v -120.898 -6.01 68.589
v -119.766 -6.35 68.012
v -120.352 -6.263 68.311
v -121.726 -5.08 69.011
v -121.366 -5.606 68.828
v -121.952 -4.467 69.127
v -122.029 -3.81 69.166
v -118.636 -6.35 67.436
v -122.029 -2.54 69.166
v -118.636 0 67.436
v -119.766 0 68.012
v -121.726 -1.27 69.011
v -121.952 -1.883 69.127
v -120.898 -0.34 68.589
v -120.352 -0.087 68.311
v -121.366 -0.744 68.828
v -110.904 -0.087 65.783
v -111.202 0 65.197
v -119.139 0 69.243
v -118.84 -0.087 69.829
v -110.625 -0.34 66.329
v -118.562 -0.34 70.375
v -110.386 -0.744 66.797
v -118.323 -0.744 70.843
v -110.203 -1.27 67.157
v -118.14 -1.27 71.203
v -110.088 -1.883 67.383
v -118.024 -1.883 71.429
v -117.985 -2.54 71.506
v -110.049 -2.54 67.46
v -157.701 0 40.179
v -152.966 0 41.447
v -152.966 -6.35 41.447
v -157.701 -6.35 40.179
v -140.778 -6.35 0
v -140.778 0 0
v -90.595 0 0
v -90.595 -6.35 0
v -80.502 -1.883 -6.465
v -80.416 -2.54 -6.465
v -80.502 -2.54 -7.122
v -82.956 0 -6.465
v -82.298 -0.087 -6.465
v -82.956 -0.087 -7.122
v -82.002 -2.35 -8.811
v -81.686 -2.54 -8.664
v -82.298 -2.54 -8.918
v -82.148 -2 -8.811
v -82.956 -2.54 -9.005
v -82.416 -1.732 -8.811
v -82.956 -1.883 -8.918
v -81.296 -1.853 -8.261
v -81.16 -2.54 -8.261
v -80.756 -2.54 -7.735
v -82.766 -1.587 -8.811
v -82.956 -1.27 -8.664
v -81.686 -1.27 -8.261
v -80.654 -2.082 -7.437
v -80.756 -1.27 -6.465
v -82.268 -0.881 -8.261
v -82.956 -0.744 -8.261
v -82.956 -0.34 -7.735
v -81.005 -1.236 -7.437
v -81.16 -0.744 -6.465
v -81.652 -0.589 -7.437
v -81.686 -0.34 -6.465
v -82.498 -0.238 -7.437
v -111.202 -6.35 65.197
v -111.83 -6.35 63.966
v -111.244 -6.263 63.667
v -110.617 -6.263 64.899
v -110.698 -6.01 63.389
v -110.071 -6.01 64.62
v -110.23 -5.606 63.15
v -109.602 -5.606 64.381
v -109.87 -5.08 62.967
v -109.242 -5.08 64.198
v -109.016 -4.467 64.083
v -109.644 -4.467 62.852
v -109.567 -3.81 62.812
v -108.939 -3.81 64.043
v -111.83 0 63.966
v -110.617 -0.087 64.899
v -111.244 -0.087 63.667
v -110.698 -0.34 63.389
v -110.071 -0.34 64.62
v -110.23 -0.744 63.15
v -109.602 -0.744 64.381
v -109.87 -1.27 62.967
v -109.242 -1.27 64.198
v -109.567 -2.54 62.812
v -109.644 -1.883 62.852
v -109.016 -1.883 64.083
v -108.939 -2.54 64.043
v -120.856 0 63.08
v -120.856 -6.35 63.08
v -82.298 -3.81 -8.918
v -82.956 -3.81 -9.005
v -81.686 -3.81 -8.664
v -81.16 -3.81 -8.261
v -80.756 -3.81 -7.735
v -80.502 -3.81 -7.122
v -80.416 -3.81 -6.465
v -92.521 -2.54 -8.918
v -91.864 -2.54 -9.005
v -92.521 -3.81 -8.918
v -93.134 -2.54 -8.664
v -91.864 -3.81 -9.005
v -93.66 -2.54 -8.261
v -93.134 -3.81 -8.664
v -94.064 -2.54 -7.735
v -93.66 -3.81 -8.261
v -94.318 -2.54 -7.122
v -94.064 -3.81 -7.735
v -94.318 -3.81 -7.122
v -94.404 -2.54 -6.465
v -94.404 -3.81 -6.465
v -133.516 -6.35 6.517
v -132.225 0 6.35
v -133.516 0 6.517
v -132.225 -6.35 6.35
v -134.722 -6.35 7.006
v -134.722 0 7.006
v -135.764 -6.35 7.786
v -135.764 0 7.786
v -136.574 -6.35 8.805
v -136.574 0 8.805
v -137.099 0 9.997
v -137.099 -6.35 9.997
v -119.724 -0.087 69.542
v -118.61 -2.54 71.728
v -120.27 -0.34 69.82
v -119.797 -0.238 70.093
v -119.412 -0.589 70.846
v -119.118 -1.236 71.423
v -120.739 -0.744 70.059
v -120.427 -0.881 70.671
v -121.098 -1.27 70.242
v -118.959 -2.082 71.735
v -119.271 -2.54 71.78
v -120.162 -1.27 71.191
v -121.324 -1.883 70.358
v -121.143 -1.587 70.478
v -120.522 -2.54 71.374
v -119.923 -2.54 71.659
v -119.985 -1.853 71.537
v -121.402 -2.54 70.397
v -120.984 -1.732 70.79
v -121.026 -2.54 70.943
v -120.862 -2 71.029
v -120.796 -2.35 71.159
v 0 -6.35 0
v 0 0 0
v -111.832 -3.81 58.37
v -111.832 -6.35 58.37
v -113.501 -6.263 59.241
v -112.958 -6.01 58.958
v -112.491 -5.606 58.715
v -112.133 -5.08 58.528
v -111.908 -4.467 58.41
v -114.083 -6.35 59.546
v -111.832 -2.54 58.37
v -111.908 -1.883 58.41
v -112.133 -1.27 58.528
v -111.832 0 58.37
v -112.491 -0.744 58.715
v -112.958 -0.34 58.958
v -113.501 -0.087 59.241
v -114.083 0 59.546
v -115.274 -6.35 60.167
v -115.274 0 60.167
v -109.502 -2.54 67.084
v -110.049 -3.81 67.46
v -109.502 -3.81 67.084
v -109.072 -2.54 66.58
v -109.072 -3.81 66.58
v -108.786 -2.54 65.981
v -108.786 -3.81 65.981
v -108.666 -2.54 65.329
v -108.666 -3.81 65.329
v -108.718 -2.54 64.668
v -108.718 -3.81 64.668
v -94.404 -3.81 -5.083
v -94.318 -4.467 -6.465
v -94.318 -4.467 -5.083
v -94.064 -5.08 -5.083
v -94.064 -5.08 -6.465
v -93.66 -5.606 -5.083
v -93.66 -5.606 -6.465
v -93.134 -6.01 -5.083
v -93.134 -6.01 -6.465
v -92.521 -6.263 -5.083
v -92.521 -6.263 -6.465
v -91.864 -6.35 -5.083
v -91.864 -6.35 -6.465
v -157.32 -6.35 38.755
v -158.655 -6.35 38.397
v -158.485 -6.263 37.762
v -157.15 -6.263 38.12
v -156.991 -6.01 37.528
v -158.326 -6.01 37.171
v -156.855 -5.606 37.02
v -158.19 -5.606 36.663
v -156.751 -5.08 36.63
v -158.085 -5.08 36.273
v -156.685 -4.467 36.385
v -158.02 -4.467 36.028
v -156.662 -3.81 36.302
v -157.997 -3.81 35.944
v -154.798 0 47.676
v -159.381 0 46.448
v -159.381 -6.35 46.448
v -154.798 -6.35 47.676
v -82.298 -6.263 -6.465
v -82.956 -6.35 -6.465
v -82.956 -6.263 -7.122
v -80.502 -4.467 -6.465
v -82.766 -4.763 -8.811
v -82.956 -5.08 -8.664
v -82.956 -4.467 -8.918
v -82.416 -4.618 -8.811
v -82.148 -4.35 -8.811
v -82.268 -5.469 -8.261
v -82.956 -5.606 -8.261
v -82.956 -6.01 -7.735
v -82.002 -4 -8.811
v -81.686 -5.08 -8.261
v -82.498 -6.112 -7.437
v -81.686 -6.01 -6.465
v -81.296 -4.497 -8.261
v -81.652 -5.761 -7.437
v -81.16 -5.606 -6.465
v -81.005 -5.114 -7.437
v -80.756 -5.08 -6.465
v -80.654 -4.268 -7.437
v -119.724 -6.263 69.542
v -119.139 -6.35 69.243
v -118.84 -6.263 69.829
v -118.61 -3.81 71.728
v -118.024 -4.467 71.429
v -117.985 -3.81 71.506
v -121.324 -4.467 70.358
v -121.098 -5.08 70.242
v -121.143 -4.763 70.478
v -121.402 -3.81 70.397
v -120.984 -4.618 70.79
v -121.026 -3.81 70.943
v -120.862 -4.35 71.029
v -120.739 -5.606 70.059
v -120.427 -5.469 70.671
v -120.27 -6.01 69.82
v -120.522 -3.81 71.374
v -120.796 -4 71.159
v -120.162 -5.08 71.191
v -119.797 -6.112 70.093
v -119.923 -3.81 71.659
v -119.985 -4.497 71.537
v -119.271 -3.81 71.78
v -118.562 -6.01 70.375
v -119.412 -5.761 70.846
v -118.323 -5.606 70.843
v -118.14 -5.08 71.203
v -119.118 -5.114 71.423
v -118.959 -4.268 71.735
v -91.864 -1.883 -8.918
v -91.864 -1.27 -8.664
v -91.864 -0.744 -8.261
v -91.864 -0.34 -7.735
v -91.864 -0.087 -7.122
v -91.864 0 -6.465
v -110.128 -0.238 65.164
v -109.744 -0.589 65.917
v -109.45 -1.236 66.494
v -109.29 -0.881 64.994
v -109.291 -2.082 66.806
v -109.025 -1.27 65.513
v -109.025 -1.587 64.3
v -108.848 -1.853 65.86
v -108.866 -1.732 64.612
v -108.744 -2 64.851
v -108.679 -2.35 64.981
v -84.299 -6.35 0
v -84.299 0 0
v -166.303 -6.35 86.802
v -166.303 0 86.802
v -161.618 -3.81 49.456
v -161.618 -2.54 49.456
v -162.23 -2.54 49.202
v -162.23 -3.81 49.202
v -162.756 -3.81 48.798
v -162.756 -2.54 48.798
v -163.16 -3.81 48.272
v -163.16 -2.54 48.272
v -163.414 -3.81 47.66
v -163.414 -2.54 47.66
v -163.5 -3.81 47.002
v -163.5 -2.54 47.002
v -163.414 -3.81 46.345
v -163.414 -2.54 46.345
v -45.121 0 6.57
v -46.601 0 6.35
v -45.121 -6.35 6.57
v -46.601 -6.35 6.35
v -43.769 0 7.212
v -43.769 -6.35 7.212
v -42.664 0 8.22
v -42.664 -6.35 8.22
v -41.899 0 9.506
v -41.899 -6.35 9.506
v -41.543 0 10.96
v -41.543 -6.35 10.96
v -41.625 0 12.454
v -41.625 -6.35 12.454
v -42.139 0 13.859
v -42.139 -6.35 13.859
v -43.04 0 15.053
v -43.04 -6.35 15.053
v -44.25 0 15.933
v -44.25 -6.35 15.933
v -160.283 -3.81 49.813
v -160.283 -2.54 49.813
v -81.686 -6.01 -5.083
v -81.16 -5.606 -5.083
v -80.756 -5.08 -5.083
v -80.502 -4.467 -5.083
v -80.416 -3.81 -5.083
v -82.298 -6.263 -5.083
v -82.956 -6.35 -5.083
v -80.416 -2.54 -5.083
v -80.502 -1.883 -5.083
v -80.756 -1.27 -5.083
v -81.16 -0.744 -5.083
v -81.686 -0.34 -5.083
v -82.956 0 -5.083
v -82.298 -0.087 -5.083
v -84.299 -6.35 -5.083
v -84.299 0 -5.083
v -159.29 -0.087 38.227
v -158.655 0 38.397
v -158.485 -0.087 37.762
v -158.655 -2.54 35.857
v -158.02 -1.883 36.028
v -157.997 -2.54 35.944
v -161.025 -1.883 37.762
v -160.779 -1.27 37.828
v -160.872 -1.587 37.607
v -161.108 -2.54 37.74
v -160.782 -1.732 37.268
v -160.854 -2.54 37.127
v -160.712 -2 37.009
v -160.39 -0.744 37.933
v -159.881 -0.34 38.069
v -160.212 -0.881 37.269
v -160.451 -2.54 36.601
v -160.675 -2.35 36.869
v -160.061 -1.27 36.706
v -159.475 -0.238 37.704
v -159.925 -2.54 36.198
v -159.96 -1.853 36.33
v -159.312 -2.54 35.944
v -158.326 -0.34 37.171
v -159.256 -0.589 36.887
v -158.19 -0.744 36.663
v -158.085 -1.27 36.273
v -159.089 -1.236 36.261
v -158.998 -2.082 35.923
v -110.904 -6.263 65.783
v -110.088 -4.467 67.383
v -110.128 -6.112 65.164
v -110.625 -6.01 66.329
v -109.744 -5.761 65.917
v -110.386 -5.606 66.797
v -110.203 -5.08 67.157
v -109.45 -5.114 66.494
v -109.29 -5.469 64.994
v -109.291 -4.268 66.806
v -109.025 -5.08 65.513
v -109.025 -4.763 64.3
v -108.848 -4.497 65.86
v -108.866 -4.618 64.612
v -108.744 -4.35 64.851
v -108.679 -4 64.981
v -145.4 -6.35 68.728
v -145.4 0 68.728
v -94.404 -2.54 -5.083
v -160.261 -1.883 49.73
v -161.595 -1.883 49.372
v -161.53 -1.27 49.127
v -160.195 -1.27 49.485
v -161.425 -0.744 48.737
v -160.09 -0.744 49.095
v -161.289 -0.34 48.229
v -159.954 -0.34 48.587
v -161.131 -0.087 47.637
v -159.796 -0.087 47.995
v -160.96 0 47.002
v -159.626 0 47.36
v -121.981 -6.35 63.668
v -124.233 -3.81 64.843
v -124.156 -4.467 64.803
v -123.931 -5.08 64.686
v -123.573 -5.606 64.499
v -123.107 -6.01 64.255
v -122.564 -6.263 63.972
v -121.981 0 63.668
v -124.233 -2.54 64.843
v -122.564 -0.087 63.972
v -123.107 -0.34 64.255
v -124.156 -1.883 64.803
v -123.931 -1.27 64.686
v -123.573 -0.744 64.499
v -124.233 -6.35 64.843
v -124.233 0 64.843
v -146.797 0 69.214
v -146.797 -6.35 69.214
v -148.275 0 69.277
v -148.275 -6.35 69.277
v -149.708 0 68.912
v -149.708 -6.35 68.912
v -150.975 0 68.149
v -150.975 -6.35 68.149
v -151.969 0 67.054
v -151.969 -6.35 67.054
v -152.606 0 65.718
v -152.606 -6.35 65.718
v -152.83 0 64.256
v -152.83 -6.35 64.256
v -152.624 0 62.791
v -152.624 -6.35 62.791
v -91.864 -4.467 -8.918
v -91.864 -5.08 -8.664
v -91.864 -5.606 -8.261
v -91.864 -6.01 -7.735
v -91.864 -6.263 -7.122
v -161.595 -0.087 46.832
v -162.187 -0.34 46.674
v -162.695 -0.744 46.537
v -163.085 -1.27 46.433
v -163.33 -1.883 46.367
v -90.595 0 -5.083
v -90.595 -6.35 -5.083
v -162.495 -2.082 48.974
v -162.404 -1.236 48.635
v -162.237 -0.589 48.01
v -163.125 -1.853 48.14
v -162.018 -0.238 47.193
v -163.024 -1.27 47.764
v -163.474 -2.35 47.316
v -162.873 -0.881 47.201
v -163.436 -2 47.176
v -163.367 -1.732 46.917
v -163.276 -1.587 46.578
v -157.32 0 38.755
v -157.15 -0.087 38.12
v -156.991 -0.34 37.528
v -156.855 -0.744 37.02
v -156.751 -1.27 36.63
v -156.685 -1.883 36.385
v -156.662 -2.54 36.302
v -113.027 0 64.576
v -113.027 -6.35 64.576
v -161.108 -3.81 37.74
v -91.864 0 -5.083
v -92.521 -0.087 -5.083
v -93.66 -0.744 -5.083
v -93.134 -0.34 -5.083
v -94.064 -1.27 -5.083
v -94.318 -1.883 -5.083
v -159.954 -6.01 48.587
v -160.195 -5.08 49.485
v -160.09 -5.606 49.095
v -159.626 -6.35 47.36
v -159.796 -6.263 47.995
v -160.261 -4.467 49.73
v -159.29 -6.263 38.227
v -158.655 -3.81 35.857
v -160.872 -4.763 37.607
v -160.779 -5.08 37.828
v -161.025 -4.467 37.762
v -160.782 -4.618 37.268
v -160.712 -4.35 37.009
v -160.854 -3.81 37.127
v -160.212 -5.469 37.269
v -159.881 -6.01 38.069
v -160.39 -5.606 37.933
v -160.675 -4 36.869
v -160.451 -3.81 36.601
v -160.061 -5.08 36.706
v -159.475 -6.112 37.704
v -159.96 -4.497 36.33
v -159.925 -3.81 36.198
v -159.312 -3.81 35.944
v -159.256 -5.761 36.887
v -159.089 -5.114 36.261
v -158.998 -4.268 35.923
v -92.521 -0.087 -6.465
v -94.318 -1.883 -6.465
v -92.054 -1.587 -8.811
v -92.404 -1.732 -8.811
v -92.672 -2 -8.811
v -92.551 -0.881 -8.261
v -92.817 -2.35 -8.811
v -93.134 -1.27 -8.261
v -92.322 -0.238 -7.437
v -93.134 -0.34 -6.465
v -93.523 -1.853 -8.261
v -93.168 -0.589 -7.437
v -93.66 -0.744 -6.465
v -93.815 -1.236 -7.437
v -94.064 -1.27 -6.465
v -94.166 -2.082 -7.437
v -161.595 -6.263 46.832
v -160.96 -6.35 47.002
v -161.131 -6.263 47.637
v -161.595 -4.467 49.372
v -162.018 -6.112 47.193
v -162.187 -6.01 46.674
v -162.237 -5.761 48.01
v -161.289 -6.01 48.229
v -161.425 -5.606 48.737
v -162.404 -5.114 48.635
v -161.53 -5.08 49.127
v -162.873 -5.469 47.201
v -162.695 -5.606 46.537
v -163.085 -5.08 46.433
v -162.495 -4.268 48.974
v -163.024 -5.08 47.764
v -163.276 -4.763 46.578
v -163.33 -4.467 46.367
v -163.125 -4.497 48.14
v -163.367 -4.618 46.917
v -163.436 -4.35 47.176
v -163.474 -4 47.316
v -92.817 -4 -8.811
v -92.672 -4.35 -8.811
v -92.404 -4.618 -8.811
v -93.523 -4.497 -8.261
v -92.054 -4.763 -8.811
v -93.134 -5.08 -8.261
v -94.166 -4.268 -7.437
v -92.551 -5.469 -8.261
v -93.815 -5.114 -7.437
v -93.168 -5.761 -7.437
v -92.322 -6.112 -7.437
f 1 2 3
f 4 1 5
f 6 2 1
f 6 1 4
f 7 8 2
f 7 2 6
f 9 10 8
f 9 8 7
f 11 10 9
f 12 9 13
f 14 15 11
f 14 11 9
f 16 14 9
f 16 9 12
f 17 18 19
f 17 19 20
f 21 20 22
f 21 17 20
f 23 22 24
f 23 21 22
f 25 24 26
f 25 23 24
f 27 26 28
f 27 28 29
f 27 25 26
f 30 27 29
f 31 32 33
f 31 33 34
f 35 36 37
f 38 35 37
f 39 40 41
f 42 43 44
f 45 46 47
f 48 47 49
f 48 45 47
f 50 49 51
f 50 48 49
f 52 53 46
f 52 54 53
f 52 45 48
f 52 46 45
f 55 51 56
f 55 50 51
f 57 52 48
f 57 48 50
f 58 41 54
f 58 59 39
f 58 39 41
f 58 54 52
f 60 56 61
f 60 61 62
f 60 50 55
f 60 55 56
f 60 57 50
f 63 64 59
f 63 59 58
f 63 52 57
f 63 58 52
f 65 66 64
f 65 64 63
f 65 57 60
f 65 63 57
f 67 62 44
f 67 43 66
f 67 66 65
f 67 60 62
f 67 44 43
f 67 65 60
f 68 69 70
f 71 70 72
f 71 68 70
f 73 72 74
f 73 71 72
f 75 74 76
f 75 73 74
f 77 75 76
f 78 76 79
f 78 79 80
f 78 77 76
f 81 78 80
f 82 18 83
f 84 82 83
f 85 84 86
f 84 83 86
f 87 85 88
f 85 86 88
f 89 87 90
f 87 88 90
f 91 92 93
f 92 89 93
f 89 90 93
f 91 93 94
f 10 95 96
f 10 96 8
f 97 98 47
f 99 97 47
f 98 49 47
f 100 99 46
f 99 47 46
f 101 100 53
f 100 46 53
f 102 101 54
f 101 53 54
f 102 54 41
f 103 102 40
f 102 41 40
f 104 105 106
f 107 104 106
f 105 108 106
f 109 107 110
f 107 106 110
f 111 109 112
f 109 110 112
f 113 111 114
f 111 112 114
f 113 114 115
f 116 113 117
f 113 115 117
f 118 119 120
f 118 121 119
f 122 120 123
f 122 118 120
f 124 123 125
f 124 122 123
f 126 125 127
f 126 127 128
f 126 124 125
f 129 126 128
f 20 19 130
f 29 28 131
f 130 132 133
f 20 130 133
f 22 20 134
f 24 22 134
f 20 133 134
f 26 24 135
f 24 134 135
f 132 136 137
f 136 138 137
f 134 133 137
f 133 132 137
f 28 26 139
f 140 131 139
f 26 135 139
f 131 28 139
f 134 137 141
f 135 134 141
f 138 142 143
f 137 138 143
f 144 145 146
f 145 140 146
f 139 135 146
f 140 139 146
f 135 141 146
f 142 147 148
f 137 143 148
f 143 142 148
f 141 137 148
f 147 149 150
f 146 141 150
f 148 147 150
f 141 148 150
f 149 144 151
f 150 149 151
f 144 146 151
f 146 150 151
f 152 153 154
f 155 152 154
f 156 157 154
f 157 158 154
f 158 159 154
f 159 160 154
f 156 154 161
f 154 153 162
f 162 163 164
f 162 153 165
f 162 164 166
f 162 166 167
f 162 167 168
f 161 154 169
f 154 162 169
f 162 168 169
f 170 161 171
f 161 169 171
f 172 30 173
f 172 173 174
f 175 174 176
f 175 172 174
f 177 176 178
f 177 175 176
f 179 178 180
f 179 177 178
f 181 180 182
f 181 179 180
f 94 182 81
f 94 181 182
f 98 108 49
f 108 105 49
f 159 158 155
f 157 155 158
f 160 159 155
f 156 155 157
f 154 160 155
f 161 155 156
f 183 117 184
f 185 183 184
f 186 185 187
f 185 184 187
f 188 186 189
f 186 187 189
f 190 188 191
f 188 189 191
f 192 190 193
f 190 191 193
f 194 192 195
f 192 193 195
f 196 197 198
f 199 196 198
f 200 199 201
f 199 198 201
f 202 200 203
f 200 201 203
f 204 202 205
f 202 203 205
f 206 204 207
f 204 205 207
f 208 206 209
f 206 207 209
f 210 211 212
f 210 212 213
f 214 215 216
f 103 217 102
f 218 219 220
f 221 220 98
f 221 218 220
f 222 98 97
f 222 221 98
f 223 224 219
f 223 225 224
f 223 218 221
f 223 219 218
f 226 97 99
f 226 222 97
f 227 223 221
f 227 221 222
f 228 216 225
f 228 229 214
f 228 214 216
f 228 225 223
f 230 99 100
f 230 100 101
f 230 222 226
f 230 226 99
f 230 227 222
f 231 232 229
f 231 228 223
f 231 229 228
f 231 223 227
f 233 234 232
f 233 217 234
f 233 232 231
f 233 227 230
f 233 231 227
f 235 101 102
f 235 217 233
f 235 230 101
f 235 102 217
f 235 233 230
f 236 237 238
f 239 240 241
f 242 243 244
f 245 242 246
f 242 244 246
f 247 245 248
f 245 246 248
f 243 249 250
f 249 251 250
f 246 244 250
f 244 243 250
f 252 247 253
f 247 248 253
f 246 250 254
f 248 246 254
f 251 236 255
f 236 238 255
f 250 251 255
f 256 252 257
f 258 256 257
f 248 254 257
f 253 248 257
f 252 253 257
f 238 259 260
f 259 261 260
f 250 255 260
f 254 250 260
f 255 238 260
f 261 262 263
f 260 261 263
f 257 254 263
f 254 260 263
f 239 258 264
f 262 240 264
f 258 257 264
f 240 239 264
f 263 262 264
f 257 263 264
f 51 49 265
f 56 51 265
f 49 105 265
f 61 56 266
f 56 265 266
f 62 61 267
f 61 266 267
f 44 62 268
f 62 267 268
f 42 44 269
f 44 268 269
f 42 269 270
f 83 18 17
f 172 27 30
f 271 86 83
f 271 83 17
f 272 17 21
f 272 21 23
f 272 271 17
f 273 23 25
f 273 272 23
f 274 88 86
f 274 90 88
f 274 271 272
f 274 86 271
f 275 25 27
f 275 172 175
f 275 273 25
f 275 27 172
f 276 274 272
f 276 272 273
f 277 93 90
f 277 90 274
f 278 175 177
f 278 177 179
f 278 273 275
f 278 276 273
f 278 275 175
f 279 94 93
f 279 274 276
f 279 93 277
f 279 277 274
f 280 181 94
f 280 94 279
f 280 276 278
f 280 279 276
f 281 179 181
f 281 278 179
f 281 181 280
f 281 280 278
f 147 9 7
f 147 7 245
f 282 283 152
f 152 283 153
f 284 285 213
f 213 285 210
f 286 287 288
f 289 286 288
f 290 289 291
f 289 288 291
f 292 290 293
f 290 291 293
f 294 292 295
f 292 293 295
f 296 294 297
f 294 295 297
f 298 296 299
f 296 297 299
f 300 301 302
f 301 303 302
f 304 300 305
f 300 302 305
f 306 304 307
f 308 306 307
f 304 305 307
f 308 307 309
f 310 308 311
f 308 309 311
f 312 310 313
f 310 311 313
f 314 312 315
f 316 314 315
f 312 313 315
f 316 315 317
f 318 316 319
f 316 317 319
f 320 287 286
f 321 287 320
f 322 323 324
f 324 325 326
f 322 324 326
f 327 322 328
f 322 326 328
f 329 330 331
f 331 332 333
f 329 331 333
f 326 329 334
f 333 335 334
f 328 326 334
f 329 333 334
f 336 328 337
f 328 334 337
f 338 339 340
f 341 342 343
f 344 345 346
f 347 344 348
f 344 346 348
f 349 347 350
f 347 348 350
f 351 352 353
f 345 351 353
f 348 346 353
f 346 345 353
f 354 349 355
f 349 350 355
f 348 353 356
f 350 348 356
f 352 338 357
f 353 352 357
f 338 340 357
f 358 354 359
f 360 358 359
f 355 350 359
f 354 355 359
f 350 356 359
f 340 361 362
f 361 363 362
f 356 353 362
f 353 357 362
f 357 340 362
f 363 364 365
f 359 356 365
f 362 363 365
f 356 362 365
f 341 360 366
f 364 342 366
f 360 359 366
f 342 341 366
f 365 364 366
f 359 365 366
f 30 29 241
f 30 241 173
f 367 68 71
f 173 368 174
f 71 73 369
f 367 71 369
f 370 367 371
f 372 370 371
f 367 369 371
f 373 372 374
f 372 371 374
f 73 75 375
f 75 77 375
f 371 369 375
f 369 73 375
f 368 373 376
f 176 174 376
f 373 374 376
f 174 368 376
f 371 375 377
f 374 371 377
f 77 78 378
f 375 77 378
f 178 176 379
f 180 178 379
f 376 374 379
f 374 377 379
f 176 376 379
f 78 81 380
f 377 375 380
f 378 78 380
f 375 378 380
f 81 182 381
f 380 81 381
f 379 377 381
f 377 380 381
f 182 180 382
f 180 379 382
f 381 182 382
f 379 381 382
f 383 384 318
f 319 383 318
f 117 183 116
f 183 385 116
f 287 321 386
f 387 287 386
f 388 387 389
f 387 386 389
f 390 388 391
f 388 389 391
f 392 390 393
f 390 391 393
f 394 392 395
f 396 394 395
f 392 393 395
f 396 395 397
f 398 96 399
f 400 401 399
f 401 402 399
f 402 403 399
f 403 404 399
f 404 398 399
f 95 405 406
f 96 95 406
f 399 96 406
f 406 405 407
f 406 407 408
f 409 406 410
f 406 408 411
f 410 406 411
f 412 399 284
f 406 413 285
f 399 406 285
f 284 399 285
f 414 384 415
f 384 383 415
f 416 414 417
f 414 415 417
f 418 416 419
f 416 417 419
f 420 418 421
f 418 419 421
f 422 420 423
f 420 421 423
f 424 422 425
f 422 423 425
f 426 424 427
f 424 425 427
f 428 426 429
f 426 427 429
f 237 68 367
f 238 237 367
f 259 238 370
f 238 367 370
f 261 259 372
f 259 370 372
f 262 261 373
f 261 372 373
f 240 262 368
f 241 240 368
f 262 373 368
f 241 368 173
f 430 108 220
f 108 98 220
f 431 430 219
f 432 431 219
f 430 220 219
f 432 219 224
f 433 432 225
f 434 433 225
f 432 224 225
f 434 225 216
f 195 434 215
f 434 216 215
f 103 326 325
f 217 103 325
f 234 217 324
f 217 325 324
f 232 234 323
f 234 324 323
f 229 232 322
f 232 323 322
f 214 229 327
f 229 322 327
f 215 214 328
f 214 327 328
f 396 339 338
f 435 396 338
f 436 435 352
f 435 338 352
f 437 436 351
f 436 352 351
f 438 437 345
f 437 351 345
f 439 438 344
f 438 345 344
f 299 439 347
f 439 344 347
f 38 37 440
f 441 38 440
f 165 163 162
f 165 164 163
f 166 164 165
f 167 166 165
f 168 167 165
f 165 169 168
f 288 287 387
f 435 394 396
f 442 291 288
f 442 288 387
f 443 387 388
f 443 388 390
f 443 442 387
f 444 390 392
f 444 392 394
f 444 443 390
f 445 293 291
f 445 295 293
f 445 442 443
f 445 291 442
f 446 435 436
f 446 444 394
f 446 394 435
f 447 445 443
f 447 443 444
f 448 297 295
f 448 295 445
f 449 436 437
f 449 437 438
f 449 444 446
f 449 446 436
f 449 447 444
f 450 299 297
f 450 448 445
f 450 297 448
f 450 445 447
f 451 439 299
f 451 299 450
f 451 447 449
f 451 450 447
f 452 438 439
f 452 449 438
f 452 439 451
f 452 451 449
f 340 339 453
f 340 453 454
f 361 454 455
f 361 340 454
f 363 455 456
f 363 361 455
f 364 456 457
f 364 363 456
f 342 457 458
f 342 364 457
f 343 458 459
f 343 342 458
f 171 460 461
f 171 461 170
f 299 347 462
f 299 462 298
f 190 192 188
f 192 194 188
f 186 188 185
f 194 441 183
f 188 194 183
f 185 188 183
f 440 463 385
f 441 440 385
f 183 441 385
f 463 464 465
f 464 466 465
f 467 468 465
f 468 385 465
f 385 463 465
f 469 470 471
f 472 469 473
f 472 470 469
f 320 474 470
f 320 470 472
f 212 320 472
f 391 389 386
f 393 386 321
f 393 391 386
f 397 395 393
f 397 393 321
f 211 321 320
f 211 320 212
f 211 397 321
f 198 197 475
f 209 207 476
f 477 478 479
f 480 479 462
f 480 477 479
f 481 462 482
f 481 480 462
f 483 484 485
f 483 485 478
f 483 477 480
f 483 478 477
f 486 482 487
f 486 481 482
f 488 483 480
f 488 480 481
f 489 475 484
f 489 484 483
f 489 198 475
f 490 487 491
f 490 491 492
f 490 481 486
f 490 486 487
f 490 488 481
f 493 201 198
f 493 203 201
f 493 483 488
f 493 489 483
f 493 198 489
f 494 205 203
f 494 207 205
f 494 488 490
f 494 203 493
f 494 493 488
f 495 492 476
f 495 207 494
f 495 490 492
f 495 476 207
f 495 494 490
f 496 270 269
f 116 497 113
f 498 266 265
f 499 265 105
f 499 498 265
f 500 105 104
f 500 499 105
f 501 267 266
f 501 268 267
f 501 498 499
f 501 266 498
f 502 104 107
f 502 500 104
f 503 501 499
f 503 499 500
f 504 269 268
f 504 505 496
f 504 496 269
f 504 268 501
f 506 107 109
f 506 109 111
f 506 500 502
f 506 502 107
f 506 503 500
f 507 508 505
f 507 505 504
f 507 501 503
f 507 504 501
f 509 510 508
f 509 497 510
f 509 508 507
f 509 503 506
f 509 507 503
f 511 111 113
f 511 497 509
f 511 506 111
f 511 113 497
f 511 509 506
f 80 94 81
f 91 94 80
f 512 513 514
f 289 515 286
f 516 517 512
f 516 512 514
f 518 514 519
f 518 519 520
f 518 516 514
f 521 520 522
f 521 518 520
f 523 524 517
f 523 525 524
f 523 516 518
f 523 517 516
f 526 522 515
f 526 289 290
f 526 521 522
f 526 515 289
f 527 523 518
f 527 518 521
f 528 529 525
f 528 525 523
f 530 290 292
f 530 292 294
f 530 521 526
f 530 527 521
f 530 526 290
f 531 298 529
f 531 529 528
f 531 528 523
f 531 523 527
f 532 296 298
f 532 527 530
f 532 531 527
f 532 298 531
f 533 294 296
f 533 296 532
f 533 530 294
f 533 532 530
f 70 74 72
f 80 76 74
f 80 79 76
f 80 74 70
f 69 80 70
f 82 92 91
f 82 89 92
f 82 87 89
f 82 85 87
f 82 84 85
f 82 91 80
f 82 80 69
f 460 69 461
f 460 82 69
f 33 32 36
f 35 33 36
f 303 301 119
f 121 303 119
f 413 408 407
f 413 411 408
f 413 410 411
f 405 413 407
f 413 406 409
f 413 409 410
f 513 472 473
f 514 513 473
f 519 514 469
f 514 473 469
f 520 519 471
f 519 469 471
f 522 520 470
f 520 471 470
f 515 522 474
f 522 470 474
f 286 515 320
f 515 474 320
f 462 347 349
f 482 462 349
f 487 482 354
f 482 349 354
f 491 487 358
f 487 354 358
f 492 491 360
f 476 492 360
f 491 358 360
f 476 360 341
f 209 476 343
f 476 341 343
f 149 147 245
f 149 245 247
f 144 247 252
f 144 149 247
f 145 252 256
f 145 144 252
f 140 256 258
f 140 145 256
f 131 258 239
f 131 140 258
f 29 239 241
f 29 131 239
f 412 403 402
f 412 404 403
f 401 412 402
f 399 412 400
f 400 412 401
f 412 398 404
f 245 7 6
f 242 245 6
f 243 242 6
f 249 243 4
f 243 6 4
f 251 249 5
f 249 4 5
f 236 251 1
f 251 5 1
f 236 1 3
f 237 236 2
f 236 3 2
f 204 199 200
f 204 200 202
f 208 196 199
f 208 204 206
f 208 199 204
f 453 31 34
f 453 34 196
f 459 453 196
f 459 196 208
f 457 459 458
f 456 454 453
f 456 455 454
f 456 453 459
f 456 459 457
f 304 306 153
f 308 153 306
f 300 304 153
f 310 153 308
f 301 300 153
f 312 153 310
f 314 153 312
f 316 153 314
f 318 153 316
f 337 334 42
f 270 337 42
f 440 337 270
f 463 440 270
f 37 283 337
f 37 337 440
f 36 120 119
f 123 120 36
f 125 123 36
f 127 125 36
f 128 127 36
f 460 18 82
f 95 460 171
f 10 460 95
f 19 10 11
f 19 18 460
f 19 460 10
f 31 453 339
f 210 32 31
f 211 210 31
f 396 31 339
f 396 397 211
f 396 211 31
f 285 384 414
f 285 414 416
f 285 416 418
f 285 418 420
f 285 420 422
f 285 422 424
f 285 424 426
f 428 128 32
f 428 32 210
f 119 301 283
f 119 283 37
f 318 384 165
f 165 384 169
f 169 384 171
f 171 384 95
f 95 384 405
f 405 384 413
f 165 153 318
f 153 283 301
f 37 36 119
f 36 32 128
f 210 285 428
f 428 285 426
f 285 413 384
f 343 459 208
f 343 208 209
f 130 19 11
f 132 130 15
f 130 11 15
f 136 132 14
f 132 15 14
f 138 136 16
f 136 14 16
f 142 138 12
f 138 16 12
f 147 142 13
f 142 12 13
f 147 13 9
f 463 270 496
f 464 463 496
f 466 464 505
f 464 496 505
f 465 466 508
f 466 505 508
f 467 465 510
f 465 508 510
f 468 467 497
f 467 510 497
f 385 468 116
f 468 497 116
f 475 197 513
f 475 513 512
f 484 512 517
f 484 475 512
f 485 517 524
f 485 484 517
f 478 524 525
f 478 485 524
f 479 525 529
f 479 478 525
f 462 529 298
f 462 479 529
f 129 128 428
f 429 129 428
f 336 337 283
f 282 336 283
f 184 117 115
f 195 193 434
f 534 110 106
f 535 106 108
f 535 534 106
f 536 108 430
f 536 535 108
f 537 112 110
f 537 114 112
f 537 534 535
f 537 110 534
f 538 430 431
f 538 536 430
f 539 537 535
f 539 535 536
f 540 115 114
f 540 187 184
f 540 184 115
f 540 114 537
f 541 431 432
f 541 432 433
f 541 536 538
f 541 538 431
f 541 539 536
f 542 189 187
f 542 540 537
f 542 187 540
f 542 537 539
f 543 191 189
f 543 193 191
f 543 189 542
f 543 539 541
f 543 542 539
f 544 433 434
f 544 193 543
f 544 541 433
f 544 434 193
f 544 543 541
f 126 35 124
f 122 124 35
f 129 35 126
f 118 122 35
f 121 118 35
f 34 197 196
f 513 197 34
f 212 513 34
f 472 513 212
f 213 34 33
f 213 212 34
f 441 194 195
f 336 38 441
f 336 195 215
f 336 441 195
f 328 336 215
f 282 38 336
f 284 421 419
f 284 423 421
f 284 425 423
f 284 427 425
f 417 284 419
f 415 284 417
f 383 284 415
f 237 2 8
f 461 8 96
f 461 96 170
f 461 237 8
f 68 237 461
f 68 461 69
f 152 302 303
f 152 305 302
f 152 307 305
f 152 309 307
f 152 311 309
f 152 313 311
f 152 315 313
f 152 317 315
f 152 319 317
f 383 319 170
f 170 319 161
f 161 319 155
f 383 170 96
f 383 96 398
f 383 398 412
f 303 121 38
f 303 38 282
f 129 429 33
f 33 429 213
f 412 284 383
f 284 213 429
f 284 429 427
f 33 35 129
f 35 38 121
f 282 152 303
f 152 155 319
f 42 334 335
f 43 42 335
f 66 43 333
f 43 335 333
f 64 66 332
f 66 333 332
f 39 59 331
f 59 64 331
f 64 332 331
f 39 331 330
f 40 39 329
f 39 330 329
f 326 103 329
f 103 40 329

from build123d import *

# Parameters (mm, degrees)
F1_DEPTH      = 6.35
F2_R          = 5.08
F4_DEPTH      = 6.35
F5_R          = 2.54
F6_R          = 2.54
F7_R          = 2.54
F8_R          = 2.54
F10_DEPTH     = 6.35
F11_R         = 2.54
F12_R         = 2.54
F13_T1_DEPTH  = 8.9083831143
F13_T3_DEPTH  = 1.27
F13_T6_ANGLE  = 90
F13_T8_ANGLE  = 90
F13_T10_ANGLE = 90
F13_T12_ANGLE = 90
F15_DEPTH     = 6.35
F16_R         = 2.54
F17_T1_DEPTH  = 1.27
F17_T4_ANGLE  = 90
F17_T6_ANGLE  = 90
F17_T10_DEPTH = 7.7319413884
F17_T15_DEPTH = 7.7319413884
F18_T1_DEPTH  = 1.27
F18_T4_ANGLE  = 90
F18_T8_DEPTH  = 7.7319413884
F18_T13_DEPTH = 7.7319413884
F18_T16_ANGLE = 90


# Not quite as in the source:
# - a fillet or chamfer that OpenCascade refuses, or shapes differently, is made with other operations: its cross-section is extruded or revolved along the edge and cut away or added


with BuildPart() as f1:
    # F0 (on Front) → F1 (new body)
    with BuildSketch(Plane.XZ):
        Polygon((-140.7776176929, 0), (0, 0), (-166.3033664227, 86.8016779423), align=None)
        Polygon((-136.0260884312, 6.35), (-155.9960301785, 74.2588582448), (-25.8894239036, 6.35), align=None, mode=Mode.SUBTRACT)
    extrude(amount=F1_DEPTH)

    # F2
    f2_edges = [f1.edges().sort_by_distance(p)[0] for p in [
        (-155.99603, -3.175, 74.258858),
        (-25.889424, -3.175, 6.35),
        (-136.026088, -3.175, 6.35),
    ]]
    fillet(f2_edges, radius=F2_R)

    # F3 (on Front) → F4 (join)
    with BuildSketch(Plane.XZ):
        Polygon((-84.2989161611, 0), (-90.5948132277, 0), (-90.5948132277, -5.0825621001), (-94.4040864706, -5.0825621001), (-94.4040864706, -9.0045034885), (-80.4157033563, -9.0045034885), (-80.4157033563, -5.0825621001), (-84.2989161611, -5.0825621001), align=None)
    extrude(amount=F4_DEPTH)

    # F5
    f5_edges = [f1.edges().sort_by_distance(p)[0] for p in [
        (-80.415703, 0, -7.043533),
    ]]
    fillet(f5_edges, radius=F5_R)

    # F6
    f6_edges = [f1.edges().sort_by_distance(p)[0] for p in [
        (-94.404086, 0, -7.043533),
    ]]
    fillet(f6_edges, radius=F6_R)

    # F7
    f7_edges = [f1.edges().sort_by_distance(p)[0] for p in [
        (-94.404086, -6.35, -7.043533),
        (-80.415703, -6.35, -7.043533),
    ]]
    fillet(f7_edges, radius=F7_R)

    # F8
    f8_edges = [f1.edges().sort_by_distance(p)[0] for p in [
        (-87.409895, -6.35, -9.004503),
        (-87.409895, 0, -9.004503),
    ]]
    fillet(f8_edges, radius=F8_R)

    # F9 (on face) → F10 (join)
    with BuildSketch(Plane(origin=(0, 0, 0), x_dir=(-1, 0, 0), z_dir=(0, 1, 0))):
        Polygon((154.6036799573, 47.7280417937), (152.9238455726, 41.4588145216), (152.9660739724, 41.4474994559), (154.7977033408, 47.6760533848), align=None)
        Polygon((154.7977033408, 47.6760533848), (152.9660739724, 41.4474994559), (157.7012996051, 40.1786995717), (156.6624483483, 36.3016538997), (160.4507528245, 35.2865807746), (164.0712127847, 48.7983212928), (160.2829083085, 49.8133944179), (159.3811339898, 46.4479268438), align=None)
    extrude(amount=-F10_DEPTH)

    # F11
    f11_edges = [f1.edges().sort_by_distance(p)[0] for p in [
        (-162.177061, -6.35, 49.305858),
        (-158.556601, -6.35, 35.794117),
    ]]
    fillet(f11_edges, radius=F11_R)

    # F12
    f12_edges = [f1.edges().sort_by_distance(p)[0] for p in [
        (-162.177061, 0, 49.305858),
        (-158.556601, 0, 35.794117),
    ]]
    fillet(f12_edges, radius=F12_R)

    # F13: fillet of radius 2.54 on 6 edges, made by hand

    # F13_s2 → F13_t1 (cut)
    with BuildSketch(Plane(origin=(-20.2272079793, 0, 75.488967874), x_dir=(0, 1, 0), z_dir=(-0.2588190451, 0, 0.9659258263))):
        with BuildLine():
            ThreePointArc((0, 143.3106868597), (-0.7439487758, 145.1067380839), (-2.54, 145.8506868597))
            Line((-2.54, 145.8506868597), (0, 145.8506868597))
            Line((0, 145.8506868597), (0, 143.3106868597))
        make_face()
        with BuildLine():
            ThreePointArc((-6.35, 143.3106868597), (-5.6060512242, 145.1067380839), (-3.81, 145.8506868597))
            Line((-3.81, 145.8506868597), (-6.35, 145.8506868597))
            Line((-6.35, 145.8506868597), (-6.35, 143.3106868597))
        make_face()
    extrude(amount=F13_T1_DEPTH, mode=Mode.SUBTRACT)

    # F13_s4 → F13_t3 (cut)
    with BuildSketch(Plane.XZ.offset(2.54)):
        with BuildLine():
            ThreePointArc((-161.1081531991, 37.7400323734), (-159.9247016003, 36.1977282224), (-157.9973012258, 35.9439811492))
            Line((-157.9973012258, 35.9439811492), (-160.4507528245, 35.2865807746))
            Line((-160.4507528245, 35.2865807746), (-161.1081531991, 37.7400323734))
        make_face()
        with BuildLine():
            ThreePointArc((-161.617761186, 49.4557216674), (-163.160065337, 48.2722700686), (-163.4138124102, 46.344869694))
            Line((-163.4138124102, 46.344869694), (-164.0712127847, 48.7983212928))
            Line((-164.0712127847, 48.7983212928), (-161.617761186, 49.4557216674))
        make_face()
    extrude(amount=F13_T3_DEPTH, mode=Mode.SUBTRACT)

    # F13_s5 → F13_t6 (revolve, cut)
    with BuildSketch(Plane.XZ.offset(2.54)):
        with BuildLine():
            ThreePointArc((-161.617761186, 49.4557216674), (-163.160065337, 48.2722700686), (-163.4138124102, 46.344869694))
            Line((-163.4138124102, 46.344869694), (-164.0712127847, 48.7983212928))
            Line((-164.0712127847, 48.7983212928), (-161.617761186, 49.4557216674))
        make_face()
    revolve(axis=Axis((-163.4138124102, -2.54, 46.344869694), (-0.9659258263, 0, -0.2588190451)), revolution_arc=F13_T6_ANGLE, mode=Mode.SUBTRACT)

    # F13_s7 → F13_t8 (revolve, cut)
    with BuildSketch(Plane(origin=(-22.5328671904, 0, 84.0938051946), x_dir=(0, 1, 0), z_dir=(0.2588190451, 0, -0.9659258263))):
        with BuildLine():
            ThreePointArc((-6.35, -143.3106868597), (-5.6060512242, -145.1067380839), (-3.81, -145.8506868597))
            Line((-3.81, -145.8506868597), (-6.35, -145.8506868597))
            Line((-6.35, -145.8506868597), (-6.35, -143.3106868597))
        make_face()
    revolve(axis=Axis((-163.4138124102, -3.81, 46.344869694), (-0.9659258263, 0, -0.2588190451)), revolution_arc=F13_T8_ANGLE, mode=Mode.SUBTRACT)

    # F13_s9 → F13_t10 (revolve, cut)
    with BuildSketch(Plane(origin=(-20.2272079793, 0, 75.488967874), x_dir=(0, 1, 0), z_dir=(-0.2588190451, 0, 0.9659258263))):
        with BuildLine():
            ThreePointArc((-3.81, 145.8506868597), (-5.6060512242, 145.1067380839), (-6.35, 143.3106868597))
            Line((-6.35, 143.3106868597), (-6.35, 145.8506868597))
            Line((-6.35, 145.8506868597), (-3.81, 145.8506868597))
        make_face()
    revolve(axis=Axis((-161.1081531991, -3.81, 37.7400323734), (0.9659258263, 0, 0.2588190451)), revolution_arc=F13_T10_ANGLE, mode=Mode.SUBTRACT)

    # F13_s11 → F13_t12 (revolve, cut)
    with BuildSketch(Plane(origin=(-20.2272079793, 0, 75.488967874), x_dir=(0, 1, 0), z_dir=(-0.2588190451, 0, 0.9659258263))):
        with BuildLine():
            ThreePointArc((-2.54, 145.8506868597), (-0.7439487758, 145.1067380839), (0, 143.3106868597))
            Line((0, 143.3106868597), (0, 145.8506868597))
            Line((0, 145.8506868597), (-2.54, 145.8506868597))
        make_face()
    revolve(axis=Axis((-161.1081531991, -2.54, 37.7400323734), (-0.9659258263, 0, -0.2588190451)), revolution_arc=F13_T12_ANGLE, mode=Mode.SUBTRACT)

    # F14 (on face) → F15 (join)
    with BuildSketch(Plane(origin=(0, 0, 0), x_dir=(-1, 0, 0), z_dir=(0, 1, 0))):
        Polygon((115.2743030785, 60.1671700704), (120.8559281551, 63.0804870568), (118.6355388683, 67.435692909), (122.0292159852, 69.1658715892), (120.2478632331, 72.6599246264), (107.7856289299, 66.3063761433), (109.5669816821, 62.8123231061), (113.026531469, 64.5760852667), align=None)
    extrude(amount=-F15_DEPTH)

    # F16
    f16_edges = [f1.edges().sort_by_distance(p)[0] for p in [
        (-114.016746, -6.35, 69.48315),
        (-114.016746, 0, 69.48315),
    ]]
    fillet(f16_edges, radius=F16_R)

    # F17: fillet of radius 2.54 on 4 edges, made by hand

    # F17_s2 → F17_t1 (cut)
    with BuildSketch(Plane.XZ.offset(2.54)):
        with BuildLine():
            ThreePointArc((-121.4015357494, 70.3970415704), (-119.9229829878, 71.6592386675), (-117.9849801771, 71.50625211))
            Line((-117.9849801771, 71.50625211), (-120.2478632331, 72.6599246264))
            Line((-120.2478632331, 72.6599246264), (-121.4015357494, 70.3970415704))
        make_face()
    extrude(amount=F17_T1_DEPTH, mode=Mode.SUBTRACT)

    # F17_s3 → F17_t4 (revolve, cut)
    with BuildSketch(Plane(origin=(3.4409642411, 0, 6.7493153968), x_dir=(0, 1, 0), z_dir=(-0.4542017781, 0, -0.8908988409))):
        with BuildLine():
            ThreePointArc((0, -137.5909489404), (-0.7439487758, -139.3870001646), (-2.54, -140.1309489404))
            Line((-2.54, -140.1309489404), (0, -140.1309489404))
            Line((0, -140.1309489404), (0, -137.5909489404))
        make_face()
    revolve(axis=Axis((-121.4015357494, -2.54, 70.3970415704), (0.8908988409, 0, -0.4542017781)), revolution_arc=F17_T4_ANGLE, mode=Mode.SUBTRACT)

    # F17_s5 → F17_t6 (revolve, cut)
    with BuildSketch(Plane(origin=(3.4409642411, 0, 6.7493153968), x_dir=(0, 1, 0), z_dir=(-0.4542017781, 0, -0.8908988409))):
        with BuildLine():
            ThreePointArc((-3.81, -140.1309489404), (-5.6060512242, -139.3870001646), (-6.35, -137.5909489404))
            Line((-6.35, -137.5909489404), (-6.35, -140.1309489404))
            Line((-6.35, -140.1309489404), (-3.81, -140.1309489404))
        make_face()
    revolve(axis=Axis((-121.4015357494, -3.81, 70.3970415704), (-0.8908988409, 0, 0.4542017781)), revolution_arc=F17_T6_ANGLE, mode=Mode.SUBTRACT)


with BuildPart() as f17_tool8:
    # F17_s9 → F17_t10 (new body)
    with BuildSketch(Plane(origin=(-0.0708972856, 0, -0.1390622243), x_dir=(0, 1, 0), z_dir=(0.4542017781, 0, 0.8908988409))):
        with BuildLine():
            ThreePointArc((-3.81, 140.1309489404), (-5.6060512242, 139.3870001646), (-6.35, 137.5909489404))
            Line((-6.35, 137.5909489404), (-6.35, 140.1309489404))
            Line((-6.35, 140.1309489404), (-3.81, 140.1309489404))
        make_face()
    extrude(amount=F17_T10_DEPTH)

    split(bisect_by=Plane(origin=(0, 0, 0), x_dir=(0, 1, 0), z_dir=(0.4627114138, 0, 0.8865089664)), keep=Keep.TOP)


with BuildPart() as f1_1:
    add(f1.part)

    # F17_t7: cut F17_tool8
    add(f17_tool8.part, mode=Mode.SUBTRACT)


with BuildPart() as f17_tool13:
    # F17_s14 → F17_t15 (new body)
    with BuildSketch(Plane(origin=(-0.0708972856, 0, -0.1390622243), x_dir=(0, 1, 0), z_dir=(0.4542017781, 0, 0.8908988409))):
        with BuildLine():
            ThreePointArc((0, 137.5909489404), (-0.7439487758, 139.3870001646), (-2.54, 140.1309489404))
            Line((-2.54, 140.1309489404), (0, 140.1309489404))
            Line((0, 140.1309489404), (0, 137.5909489404))
        make_face()
    extrude(amount=F17_T15_DEPTH)

    split(bisect_by=Plane(origin=(0, 0, 0), x_dir=(0, 1, 0), z_dir=(0.4627114138, 0, 0.8865089664)), keep=Keep.TOP)


with BuildPart() as f1_2:
    add(f1_1.part)

    # F17_t12: cut F17_tool13
    add(f17_tool13.part, mode=Mode.SUBTRACT)

    # F18: fillet of radius 2.54 on 5 edges, made by hand

    # F18_s2 → F18_t1 (cut)
    with BuildSketch(Plane.XZ.offset(2.54)):
        with BuildLine():
            ThreePointArc((-110.0485119859, 67.4600486596), (-108.7863148888, 65.981495898), (-108.9393014463, 64.0434930873))
            Line((-108.9393014463, 64.0434930873), (-107.7856289299, 66.3063761433))
            Line((-107.7856289299, 66.3063761433), (-110.0485119859, 67.4600486596))
        make_face()
    extrude(amount=F18_T1_DEPTH, mode=Mode.SUBTRACT)

    # F18_s3 → F18_t4 (revolve, cut)
    with BuildSketch(Plane(origin=(3.4409642411, 0, 6.7493153968), x_dir=(0, 1, 0), z_dir=(-0.4542017781, 0, -0.8908988409))):
        with BuildLine():
            ThreePointArc((0, -128.6825658261), (-0.7439487758, -126.8865146019), (-2.54, -126.1425658261))
            Line((-2.54, -126.1425658261), (0, -126.1425658261))
            Line((0, -126.1425658261), (0, -128.6825658261))
        make_face()
    revolve(axis=Axis((-108.9393014463, -2.54, 64.0434930873), (0.8908988409, 0, -0.4542017781)), revolution_arc=F18_T4_ANGLE, mode=Mode.SUBTRACT)


with BuildPart() as f18_tool6:
    # F18_s7 → F18_t8 (new body)
    with BuildSketch(Plane(origin=(3.4409642411, 0, 6.7493153968), x_dir=(0, 1, 0), z_dir=(-0.4542017781, 0, -0.8908988409))):
        with BuildLine():
            ThreePointArc((0, -128.6825658261), (-0.7439487758, -126.8865146019), (-2.54, -126.1425658261))
            Line((-2.54, -126.1425658261), (0, -126.1425658261))
            Line((0, -126.1425658261), (0, -128.6825658261))
        make_face()
    extrude(amount=F18_T8_DEPTH)

    split(bisect_by=Plane(origin=(0, 0, 0), x_dir=(0, 1, 0), z_dir=(0.4627114138, 0, 0.8865089664)), keep=Keep.TOP)


with BuildPart() as f1_3:
    add(f1_2.part)

    # F18_t5: cut F18_tool6
    add(f18_tool6.part, mode=Mode.SUBTRACT)


with BuildPart() as f18_tool11:
    # F18_s12 → F18_t13 (new body)
    with BuildSketch(Plane(origin=(3.4409642411, 0, 6.7493153968), x_dir=(0, 1, 0), z_dir=(-0.4542017781, 0, -0.8908988409))):
        with BuildLine():
            ThreePointArc((-6.35, -128.6825658261), (-5.6060512242, -126.8865146019), (-3.81, -126.1425658261))
            Line((-3.81, -126.1425658261), (-6.35, -126.1425658261))
            Line((-6.35, -126.1425658261), (-6.35, -128.6825658261))
        make_face()
    extrude(amount=F18_T13_DEPTH)

    split(bisect_by=Plane(origin=(0, 0, 0), x_dir=(0, 1, 0), z_dir=(0.4627114138, 0, 0.8865089664)), keep=Keep.TOP)


with BuildPart() as f1_4:
    add(f1_3.part)

    # F18_t10: cut F18_tool11
    add(f18_tool11.part, mode=Mode.SUBTRACT)

    # F18_s15 → F18_t16 (revolve, cut)
    with BuildSketch(Plane(origin=(3.4409642411, 0, 6.7493153968), x_dir=(0, 1, 0), z_dir=(-0.4542017781, 0, -0.8908988409))):
        with BuildLine():
            ThreePointArc((-6.35, -128.6825658261), (-5.6060512242, -126.8865146019), (-3.81, -126.1425658261))
            Line((-3.81, -126.1425658261), (-6.35, -126.1425658261))
            Line((-6.35, -126.1425658261), (-6.35, -128.6825658261))
        make_face()
    revolve(axis=Axis((-108.9393014463, -3.81, 64.0434930873), (-0.8908988409, 0, 0.4542017781)), revolution_arc=F18_T16_ANGLE, mode=Mode.SUBTRACT)


solid = f1_4.part
